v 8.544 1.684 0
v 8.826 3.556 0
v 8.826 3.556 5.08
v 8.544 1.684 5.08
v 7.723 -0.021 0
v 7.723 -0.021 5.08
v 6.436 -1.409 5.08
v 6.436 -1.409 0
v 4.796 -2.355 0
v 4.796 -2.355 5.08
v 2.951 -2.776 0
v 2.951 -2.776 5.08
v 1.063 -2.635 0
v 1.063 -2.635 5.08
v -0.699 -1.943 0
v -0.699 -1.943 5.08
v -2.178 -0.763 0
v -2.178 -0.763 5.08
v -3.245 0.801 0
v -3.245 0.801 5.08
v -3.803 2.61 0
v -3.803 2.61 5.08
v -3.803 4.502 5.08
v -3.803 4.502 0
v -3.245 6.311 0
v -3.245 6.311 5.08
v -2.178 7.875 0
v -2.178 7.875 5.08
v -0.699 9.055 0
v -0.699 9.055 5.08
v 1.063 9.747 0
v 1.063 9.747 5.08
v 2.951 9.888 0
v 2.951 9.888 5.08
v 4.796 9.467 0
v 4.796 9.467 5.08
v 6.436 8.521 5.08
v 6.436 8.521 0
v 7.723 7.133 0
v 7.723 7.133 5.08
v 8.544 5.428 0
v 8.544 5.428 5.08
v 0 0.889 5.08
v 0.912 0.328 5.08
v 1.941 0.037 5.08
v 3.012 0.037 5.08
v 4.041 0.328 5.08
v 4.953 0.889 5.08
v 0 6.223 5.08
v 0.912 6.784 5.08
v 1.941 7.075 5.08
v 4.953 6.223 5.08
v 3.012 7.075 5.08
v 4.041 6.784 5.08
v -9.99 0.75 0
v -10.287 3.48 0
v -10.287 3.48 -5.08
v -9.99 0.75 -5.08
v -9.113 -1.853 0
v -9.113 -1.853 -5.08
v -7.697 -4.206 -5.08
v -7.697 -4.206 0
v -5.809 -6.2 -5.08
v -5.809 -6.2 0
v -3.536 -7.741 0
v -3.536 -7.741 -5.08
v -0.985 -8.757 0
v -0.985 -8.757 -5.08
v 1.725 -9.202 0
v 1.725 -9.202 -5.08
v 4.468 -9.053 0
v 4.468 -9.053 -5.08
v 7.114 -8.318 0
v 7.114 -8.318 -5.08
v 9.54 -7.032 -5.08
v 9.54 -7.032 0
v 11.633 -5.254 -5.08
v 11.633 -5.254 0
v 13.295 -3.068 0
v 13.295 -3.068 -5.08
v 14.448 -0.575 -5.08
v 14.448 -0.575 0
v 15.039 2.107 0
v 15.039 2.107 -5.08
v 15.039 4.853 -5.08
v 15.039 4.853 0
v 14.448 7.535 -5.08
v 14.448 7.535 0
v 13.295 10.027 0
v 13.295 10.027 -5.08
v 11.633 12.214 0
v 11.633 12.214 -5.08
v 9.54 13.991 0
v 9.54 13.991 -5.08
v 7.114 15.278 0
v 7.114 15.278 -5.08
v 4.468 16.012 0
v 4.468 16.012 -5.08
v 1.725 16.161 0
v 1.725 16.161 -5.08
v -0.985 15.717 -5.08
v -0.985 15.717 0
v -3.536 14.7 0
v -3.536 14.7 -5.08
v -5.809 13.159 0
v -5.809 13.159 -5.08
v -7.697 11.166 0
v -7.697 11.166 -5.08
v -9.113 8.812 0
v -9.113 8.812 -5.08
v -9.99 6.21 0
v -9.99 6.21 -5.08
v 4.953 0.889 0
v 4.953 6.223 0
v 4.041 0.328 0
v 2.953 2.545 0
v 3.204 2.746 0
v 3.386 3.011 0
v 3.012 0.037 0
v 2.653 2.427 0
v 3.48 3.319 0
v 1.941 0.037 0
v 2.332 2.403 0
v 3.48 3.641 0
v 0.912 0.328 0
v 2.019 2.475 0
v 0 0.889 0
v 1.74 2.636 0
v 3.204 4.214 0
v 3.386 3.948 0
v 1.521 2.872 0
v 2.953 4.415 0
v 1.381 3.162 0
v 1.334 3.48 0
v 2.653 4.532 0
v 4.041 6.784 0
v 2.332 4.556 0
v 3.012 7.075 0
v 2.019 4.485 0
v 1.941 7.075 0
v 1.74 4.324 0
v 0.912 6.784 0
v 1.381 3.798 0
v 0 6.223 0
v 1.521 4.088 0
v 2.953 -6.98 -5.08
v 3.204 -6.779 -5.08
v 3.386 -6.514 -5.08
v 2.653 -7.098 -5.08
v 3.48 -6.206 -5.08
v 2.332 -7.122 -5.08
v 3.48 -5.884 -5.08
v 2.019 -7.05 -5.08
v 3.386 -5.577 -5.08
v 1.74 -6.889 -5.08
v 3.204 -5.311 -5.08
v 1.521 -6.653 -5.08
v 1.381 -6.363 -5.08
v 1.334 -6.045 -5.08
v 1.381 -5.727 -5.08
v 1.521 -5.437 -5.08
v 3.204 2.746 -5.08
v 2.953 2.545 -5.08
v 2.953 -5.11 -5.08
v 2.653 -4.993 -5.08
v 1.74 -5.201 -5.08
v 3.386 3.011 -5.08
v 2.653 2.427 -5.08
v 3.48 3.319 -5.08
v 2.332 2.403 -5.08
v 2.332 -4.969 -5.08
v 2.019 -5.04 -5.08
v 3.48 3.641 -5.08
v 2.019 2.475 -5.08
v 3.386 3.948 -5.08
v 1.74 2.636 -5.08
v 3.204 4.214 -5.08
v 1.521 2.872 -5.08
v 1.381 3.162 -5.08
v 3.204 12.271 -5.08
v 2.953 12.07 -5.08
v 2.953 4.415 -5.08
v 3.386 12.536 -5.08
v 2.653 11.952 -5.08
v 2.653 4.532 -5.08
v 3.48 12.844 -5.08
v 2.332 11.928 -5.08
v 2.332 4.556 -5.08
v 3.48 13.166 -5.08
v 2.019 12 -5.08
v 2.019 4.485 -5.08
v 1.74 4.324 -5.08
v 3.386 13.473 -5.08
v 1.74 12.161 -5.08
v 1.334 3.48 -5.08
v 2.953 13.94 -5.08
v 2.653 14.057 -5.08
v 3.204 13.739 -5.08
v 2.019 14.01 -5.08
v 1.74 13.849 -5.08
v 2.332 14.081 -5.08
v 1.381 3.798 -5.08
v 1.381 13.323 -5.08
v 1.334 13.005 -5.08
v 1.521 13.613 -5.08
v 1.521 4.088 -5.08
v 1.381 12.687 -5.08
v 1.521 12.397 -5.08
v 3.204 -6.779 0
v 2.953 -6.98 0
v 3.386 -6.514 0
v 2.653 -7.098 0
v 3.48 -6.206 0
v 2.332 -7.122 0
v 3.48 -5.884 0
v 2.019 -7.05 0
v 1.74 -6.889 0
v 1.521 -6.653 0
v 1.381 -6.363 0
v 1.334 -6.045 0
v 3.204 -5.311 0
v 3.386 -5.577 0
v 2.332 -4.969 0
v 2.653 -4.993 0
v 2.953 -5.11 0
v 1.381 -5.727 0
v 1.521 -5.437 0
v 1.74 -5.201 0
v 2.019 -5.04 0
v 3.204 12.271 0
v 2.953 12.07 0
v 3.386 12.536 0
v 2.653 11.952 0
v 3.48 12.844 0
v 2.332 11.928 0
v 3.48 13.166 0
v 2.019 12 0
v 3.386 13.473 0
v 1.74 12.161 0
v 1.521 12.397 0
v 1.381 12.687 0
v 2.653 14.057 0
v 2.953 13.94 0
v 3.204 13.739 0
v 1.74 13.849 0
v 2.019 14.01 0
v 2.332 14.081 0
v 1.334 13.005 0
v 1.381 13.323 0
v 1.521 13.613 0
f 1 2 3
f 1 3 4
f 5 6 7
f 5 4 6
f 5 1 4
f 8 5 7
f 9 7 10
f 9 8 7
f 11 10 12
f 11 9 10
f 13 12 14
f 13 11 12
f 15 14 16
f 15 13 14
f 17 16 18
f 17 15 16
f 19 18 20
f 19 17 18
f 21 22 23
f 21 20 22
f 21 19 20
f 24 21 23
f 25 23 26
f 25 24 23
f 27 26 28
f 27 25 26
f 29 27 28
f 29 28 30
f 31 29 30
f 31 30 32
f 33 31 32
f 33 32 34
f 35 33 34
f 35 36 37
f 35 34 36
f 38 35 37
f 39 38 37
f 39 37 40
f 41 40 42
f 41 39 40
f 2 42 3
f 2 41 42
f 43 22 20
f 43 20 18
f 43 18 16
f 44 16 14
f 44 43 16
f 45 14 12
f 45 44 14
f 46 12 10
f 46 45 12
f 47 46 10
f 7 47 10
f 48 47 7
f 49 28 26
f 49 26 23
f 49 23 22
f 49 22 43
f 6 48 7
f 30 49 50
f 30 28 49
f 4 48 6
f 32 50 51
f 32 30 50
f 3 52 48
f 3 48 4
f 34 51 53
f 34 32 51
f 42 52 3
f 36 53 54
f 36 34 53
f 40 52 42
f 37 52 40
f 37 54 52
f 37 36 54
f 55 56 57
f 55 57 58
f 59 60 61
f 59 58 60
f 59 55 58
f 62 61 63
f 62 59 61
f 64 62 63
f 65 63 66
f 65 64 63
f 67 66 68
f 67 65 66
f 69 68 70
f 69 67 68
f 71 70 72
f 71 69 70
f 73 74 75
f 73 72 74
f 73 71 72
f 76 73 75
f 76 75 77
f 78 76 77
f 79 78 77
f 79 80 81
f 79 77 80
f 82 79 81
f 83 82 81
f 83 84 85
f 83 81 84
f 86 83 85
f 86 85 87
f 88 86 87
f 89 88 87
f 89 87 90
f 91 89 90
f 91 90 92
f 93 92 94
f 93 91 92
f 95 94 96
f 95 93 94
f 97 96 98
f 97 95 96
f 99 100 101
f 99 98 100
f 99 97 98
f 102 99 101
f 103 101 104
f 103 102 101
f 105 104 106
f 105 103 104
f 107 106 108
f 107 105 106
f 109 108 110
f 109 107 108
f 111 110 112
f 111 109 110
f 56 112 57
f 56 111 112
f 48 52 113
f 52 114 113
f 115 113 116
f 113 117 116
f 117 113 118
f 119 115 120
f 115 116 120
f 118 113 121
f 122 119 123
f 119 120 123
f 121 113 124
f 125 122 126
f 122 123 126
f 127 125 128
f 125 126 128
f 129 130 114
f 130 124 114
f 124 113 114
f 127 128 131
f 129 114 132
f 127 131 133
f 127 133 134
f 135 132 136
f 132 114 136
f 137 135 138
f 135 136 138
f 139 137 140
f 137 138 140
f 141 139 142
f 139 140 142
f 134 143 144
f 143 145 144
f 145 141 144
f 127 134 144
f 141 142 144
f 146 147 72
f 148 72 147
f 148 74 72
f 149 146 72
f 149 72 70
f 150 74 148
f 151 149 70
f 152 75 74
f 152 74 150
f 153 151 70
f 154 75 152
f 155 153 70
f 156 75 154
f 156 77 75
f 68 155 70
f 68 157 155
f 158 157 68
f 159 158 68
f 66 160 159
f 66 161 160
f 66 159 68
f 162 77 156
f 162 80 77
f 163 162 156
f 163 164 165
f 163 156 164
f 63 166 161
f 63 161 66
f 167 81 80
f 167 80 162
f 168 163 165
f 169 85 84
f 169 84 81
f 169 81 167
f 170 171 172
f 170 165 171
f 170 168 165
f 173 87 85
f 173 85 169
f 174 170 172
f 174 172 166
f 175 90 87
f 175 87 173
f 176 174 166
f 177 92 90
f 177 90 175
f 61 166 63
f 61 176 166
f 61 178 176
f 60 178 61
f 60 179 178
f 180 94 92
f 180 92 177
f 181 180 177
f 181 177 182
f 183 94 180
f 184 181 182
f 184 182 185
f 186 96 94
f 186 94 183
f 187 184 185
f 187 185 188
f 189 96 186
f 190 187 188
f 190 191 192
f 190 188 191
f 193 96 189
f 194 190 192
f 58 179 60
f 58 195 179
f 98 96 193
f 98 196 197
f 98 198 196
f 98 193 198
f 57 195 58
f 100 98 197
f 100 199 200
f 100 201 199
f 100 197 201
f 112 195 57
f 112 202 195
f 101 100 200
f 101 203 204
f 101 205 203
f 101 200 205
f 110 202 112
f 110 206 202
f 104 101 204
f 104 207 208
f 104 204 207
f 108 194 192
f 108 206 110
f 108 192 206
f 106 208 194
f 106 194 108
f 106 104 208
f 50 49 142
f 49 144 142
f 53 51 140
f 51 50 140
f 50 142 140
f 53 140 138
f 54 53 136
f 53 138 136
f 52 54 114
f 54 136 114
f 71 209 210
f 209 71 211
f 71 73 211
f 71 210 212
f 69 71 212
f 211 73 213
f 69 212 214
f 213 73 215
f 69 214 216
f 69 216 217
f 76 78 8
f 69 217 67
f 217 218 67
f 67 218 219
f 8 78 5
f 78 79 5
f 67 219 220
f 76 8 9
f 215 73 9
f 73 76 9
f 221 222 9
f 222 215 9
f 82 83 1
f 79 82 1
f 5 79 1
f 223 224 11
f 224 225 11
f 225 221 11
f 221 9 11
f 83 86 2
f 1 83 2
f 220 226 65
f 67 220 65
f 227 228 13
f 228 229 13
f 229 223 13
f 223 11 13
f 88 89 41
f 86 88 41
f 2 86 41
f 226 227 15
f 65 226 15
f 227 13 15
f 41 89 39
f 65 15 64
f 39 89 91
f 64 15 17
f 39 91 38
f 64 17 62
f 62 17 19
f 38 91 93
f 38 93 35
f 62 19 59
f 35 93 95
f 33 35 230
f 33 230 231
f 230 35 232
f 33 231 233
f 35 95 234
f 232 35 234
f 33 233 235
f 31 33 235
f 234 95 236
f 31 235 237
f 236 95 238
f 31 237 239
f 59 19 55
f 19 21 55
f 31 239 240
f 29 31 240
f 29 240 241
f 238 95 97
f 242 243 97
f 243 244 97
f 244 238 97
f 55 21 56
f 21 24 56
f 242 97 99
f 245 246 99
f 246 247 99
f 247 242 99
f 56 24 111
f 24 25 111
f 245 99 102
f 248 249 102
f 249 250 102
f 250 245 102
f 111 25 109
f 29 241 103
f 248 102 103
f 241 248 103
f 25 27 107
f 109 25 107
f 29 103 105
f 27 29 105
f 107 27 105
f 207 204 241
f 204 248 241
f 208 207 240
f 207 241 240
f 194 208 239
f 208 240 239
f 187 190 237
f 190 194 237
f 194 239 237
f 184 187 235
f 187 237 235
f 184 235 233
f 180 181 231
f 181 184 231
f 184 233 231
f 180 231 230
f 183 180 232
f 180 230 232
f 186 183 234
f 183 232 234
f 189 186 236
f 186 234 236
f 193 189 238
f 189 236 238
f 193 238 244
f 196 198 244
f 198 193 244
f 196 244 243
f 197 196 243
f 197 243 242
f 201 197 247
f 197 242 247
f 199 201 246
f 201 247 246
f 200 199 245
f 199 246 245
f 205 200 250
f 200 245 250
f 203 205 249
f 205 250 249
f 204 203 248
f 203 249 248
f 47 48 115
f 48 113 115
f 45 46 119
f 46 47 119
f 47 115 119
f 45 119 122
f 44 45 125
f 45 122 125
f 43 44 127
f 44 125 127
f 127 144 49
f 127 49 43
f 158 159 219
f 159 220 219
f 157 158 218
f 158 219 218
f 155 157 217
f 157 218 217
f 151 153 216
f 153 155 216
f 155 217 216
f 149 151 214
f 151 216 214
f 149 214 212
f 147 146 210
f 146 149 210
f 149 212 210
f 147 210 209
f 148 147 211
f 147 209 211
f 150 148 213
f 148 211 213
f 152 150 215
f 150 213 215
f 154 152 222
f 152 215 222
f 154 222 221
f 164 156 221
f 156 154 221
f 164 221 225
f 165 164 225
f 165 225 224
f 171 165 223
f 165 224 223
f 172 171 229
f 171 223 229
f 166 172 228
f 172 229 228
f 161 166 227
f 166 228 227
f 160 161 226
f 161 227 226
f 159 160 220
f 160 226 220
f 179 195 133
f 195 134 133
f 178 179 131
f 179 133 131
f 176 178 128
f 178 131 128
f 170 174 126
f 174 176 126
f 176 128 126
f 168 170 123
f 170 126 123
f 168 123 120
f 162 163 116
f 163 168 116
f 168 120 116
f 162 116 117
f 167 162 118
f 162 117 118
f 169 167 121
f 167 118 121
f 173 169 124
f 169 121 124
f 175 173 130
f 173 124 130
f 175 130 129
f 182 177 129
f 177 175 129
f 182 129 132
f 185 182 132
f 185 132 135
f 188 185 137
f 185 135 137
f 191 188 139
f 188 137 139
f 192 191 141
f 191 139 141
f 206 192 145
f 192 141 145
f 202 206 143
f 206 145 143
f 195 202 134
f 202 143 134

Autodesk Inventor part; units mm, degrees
ref_plane "YZ Plane" through (0, 0, 0) normal (1, 0, 0) x (0, 1, 0)
ref_plane "XZ Plane" through (0, 0, 0) normal (0, 1, 0) x (-1, 0, 0)
ref_plane "XY Plane" through (0, 0, 0) normal (0, 0, 1) x (1, 0, 0)
sketch "Sketch1" plane through (0, 0, 0) normal (0, 0, 1) x (1, 0, 0)
  arc A0 (4.953, 6.223) -> (0, 6.223) centre (2.4765, 3.2181) ccw
  arc A1 (0, 0.889) -> (4.953, 0.889) centre (2.4765, 3.8939) ccw
  line L0 (0, 6.223) -> (0, 0.889)
  line L1 (4.953, 6.223) -> (4.953, 0.889)
  circle A2 centre (2.4765, 3.556) radius 6.35
  dimension "d26" = 12.7
  dimension "d27" = 5.334
  dimension "d28" = 4.953
  dimension "d29" = 3.8939
  dimension "d30" = 3.8939
  dimension "d31" = 5.334
  dimension "d32" = 2.794
  dimension "d33" = 0.3379
  dimension "d34" = 2.4765
  dimension "d35" = 2.4765
extrude "Extrusion1" add sketch "Sketch1" along normal blind 5.08
sketch "Sketch2" plane through (2.413, 3.4798, 0) normal (0, 0, -1) x (-1, 0, 0)
  circle A0 centre (0, 0) radius 12.7
  circle A1 centre (0, 0) radius 1.0795
  circle A2 centre (0, 0) radius 6.35 projected
  circle A3 centre (0, 9.525) radius 1.0795
  circle A4 centre (0, -9.525) radius 1.0795
  point P0 (2.413, -3.4798)
  dimension "d16" = 25.4
  dimension "d17" = 2.159
  dimension "d18" = 2.159
  dimension "d19" = 2.159
extrude "Extrusion2" add sketch "Sketch2" along normal blind 5.08 contours A0 | A2
properties part number "Zoetrope_Motor_Connector v3"
